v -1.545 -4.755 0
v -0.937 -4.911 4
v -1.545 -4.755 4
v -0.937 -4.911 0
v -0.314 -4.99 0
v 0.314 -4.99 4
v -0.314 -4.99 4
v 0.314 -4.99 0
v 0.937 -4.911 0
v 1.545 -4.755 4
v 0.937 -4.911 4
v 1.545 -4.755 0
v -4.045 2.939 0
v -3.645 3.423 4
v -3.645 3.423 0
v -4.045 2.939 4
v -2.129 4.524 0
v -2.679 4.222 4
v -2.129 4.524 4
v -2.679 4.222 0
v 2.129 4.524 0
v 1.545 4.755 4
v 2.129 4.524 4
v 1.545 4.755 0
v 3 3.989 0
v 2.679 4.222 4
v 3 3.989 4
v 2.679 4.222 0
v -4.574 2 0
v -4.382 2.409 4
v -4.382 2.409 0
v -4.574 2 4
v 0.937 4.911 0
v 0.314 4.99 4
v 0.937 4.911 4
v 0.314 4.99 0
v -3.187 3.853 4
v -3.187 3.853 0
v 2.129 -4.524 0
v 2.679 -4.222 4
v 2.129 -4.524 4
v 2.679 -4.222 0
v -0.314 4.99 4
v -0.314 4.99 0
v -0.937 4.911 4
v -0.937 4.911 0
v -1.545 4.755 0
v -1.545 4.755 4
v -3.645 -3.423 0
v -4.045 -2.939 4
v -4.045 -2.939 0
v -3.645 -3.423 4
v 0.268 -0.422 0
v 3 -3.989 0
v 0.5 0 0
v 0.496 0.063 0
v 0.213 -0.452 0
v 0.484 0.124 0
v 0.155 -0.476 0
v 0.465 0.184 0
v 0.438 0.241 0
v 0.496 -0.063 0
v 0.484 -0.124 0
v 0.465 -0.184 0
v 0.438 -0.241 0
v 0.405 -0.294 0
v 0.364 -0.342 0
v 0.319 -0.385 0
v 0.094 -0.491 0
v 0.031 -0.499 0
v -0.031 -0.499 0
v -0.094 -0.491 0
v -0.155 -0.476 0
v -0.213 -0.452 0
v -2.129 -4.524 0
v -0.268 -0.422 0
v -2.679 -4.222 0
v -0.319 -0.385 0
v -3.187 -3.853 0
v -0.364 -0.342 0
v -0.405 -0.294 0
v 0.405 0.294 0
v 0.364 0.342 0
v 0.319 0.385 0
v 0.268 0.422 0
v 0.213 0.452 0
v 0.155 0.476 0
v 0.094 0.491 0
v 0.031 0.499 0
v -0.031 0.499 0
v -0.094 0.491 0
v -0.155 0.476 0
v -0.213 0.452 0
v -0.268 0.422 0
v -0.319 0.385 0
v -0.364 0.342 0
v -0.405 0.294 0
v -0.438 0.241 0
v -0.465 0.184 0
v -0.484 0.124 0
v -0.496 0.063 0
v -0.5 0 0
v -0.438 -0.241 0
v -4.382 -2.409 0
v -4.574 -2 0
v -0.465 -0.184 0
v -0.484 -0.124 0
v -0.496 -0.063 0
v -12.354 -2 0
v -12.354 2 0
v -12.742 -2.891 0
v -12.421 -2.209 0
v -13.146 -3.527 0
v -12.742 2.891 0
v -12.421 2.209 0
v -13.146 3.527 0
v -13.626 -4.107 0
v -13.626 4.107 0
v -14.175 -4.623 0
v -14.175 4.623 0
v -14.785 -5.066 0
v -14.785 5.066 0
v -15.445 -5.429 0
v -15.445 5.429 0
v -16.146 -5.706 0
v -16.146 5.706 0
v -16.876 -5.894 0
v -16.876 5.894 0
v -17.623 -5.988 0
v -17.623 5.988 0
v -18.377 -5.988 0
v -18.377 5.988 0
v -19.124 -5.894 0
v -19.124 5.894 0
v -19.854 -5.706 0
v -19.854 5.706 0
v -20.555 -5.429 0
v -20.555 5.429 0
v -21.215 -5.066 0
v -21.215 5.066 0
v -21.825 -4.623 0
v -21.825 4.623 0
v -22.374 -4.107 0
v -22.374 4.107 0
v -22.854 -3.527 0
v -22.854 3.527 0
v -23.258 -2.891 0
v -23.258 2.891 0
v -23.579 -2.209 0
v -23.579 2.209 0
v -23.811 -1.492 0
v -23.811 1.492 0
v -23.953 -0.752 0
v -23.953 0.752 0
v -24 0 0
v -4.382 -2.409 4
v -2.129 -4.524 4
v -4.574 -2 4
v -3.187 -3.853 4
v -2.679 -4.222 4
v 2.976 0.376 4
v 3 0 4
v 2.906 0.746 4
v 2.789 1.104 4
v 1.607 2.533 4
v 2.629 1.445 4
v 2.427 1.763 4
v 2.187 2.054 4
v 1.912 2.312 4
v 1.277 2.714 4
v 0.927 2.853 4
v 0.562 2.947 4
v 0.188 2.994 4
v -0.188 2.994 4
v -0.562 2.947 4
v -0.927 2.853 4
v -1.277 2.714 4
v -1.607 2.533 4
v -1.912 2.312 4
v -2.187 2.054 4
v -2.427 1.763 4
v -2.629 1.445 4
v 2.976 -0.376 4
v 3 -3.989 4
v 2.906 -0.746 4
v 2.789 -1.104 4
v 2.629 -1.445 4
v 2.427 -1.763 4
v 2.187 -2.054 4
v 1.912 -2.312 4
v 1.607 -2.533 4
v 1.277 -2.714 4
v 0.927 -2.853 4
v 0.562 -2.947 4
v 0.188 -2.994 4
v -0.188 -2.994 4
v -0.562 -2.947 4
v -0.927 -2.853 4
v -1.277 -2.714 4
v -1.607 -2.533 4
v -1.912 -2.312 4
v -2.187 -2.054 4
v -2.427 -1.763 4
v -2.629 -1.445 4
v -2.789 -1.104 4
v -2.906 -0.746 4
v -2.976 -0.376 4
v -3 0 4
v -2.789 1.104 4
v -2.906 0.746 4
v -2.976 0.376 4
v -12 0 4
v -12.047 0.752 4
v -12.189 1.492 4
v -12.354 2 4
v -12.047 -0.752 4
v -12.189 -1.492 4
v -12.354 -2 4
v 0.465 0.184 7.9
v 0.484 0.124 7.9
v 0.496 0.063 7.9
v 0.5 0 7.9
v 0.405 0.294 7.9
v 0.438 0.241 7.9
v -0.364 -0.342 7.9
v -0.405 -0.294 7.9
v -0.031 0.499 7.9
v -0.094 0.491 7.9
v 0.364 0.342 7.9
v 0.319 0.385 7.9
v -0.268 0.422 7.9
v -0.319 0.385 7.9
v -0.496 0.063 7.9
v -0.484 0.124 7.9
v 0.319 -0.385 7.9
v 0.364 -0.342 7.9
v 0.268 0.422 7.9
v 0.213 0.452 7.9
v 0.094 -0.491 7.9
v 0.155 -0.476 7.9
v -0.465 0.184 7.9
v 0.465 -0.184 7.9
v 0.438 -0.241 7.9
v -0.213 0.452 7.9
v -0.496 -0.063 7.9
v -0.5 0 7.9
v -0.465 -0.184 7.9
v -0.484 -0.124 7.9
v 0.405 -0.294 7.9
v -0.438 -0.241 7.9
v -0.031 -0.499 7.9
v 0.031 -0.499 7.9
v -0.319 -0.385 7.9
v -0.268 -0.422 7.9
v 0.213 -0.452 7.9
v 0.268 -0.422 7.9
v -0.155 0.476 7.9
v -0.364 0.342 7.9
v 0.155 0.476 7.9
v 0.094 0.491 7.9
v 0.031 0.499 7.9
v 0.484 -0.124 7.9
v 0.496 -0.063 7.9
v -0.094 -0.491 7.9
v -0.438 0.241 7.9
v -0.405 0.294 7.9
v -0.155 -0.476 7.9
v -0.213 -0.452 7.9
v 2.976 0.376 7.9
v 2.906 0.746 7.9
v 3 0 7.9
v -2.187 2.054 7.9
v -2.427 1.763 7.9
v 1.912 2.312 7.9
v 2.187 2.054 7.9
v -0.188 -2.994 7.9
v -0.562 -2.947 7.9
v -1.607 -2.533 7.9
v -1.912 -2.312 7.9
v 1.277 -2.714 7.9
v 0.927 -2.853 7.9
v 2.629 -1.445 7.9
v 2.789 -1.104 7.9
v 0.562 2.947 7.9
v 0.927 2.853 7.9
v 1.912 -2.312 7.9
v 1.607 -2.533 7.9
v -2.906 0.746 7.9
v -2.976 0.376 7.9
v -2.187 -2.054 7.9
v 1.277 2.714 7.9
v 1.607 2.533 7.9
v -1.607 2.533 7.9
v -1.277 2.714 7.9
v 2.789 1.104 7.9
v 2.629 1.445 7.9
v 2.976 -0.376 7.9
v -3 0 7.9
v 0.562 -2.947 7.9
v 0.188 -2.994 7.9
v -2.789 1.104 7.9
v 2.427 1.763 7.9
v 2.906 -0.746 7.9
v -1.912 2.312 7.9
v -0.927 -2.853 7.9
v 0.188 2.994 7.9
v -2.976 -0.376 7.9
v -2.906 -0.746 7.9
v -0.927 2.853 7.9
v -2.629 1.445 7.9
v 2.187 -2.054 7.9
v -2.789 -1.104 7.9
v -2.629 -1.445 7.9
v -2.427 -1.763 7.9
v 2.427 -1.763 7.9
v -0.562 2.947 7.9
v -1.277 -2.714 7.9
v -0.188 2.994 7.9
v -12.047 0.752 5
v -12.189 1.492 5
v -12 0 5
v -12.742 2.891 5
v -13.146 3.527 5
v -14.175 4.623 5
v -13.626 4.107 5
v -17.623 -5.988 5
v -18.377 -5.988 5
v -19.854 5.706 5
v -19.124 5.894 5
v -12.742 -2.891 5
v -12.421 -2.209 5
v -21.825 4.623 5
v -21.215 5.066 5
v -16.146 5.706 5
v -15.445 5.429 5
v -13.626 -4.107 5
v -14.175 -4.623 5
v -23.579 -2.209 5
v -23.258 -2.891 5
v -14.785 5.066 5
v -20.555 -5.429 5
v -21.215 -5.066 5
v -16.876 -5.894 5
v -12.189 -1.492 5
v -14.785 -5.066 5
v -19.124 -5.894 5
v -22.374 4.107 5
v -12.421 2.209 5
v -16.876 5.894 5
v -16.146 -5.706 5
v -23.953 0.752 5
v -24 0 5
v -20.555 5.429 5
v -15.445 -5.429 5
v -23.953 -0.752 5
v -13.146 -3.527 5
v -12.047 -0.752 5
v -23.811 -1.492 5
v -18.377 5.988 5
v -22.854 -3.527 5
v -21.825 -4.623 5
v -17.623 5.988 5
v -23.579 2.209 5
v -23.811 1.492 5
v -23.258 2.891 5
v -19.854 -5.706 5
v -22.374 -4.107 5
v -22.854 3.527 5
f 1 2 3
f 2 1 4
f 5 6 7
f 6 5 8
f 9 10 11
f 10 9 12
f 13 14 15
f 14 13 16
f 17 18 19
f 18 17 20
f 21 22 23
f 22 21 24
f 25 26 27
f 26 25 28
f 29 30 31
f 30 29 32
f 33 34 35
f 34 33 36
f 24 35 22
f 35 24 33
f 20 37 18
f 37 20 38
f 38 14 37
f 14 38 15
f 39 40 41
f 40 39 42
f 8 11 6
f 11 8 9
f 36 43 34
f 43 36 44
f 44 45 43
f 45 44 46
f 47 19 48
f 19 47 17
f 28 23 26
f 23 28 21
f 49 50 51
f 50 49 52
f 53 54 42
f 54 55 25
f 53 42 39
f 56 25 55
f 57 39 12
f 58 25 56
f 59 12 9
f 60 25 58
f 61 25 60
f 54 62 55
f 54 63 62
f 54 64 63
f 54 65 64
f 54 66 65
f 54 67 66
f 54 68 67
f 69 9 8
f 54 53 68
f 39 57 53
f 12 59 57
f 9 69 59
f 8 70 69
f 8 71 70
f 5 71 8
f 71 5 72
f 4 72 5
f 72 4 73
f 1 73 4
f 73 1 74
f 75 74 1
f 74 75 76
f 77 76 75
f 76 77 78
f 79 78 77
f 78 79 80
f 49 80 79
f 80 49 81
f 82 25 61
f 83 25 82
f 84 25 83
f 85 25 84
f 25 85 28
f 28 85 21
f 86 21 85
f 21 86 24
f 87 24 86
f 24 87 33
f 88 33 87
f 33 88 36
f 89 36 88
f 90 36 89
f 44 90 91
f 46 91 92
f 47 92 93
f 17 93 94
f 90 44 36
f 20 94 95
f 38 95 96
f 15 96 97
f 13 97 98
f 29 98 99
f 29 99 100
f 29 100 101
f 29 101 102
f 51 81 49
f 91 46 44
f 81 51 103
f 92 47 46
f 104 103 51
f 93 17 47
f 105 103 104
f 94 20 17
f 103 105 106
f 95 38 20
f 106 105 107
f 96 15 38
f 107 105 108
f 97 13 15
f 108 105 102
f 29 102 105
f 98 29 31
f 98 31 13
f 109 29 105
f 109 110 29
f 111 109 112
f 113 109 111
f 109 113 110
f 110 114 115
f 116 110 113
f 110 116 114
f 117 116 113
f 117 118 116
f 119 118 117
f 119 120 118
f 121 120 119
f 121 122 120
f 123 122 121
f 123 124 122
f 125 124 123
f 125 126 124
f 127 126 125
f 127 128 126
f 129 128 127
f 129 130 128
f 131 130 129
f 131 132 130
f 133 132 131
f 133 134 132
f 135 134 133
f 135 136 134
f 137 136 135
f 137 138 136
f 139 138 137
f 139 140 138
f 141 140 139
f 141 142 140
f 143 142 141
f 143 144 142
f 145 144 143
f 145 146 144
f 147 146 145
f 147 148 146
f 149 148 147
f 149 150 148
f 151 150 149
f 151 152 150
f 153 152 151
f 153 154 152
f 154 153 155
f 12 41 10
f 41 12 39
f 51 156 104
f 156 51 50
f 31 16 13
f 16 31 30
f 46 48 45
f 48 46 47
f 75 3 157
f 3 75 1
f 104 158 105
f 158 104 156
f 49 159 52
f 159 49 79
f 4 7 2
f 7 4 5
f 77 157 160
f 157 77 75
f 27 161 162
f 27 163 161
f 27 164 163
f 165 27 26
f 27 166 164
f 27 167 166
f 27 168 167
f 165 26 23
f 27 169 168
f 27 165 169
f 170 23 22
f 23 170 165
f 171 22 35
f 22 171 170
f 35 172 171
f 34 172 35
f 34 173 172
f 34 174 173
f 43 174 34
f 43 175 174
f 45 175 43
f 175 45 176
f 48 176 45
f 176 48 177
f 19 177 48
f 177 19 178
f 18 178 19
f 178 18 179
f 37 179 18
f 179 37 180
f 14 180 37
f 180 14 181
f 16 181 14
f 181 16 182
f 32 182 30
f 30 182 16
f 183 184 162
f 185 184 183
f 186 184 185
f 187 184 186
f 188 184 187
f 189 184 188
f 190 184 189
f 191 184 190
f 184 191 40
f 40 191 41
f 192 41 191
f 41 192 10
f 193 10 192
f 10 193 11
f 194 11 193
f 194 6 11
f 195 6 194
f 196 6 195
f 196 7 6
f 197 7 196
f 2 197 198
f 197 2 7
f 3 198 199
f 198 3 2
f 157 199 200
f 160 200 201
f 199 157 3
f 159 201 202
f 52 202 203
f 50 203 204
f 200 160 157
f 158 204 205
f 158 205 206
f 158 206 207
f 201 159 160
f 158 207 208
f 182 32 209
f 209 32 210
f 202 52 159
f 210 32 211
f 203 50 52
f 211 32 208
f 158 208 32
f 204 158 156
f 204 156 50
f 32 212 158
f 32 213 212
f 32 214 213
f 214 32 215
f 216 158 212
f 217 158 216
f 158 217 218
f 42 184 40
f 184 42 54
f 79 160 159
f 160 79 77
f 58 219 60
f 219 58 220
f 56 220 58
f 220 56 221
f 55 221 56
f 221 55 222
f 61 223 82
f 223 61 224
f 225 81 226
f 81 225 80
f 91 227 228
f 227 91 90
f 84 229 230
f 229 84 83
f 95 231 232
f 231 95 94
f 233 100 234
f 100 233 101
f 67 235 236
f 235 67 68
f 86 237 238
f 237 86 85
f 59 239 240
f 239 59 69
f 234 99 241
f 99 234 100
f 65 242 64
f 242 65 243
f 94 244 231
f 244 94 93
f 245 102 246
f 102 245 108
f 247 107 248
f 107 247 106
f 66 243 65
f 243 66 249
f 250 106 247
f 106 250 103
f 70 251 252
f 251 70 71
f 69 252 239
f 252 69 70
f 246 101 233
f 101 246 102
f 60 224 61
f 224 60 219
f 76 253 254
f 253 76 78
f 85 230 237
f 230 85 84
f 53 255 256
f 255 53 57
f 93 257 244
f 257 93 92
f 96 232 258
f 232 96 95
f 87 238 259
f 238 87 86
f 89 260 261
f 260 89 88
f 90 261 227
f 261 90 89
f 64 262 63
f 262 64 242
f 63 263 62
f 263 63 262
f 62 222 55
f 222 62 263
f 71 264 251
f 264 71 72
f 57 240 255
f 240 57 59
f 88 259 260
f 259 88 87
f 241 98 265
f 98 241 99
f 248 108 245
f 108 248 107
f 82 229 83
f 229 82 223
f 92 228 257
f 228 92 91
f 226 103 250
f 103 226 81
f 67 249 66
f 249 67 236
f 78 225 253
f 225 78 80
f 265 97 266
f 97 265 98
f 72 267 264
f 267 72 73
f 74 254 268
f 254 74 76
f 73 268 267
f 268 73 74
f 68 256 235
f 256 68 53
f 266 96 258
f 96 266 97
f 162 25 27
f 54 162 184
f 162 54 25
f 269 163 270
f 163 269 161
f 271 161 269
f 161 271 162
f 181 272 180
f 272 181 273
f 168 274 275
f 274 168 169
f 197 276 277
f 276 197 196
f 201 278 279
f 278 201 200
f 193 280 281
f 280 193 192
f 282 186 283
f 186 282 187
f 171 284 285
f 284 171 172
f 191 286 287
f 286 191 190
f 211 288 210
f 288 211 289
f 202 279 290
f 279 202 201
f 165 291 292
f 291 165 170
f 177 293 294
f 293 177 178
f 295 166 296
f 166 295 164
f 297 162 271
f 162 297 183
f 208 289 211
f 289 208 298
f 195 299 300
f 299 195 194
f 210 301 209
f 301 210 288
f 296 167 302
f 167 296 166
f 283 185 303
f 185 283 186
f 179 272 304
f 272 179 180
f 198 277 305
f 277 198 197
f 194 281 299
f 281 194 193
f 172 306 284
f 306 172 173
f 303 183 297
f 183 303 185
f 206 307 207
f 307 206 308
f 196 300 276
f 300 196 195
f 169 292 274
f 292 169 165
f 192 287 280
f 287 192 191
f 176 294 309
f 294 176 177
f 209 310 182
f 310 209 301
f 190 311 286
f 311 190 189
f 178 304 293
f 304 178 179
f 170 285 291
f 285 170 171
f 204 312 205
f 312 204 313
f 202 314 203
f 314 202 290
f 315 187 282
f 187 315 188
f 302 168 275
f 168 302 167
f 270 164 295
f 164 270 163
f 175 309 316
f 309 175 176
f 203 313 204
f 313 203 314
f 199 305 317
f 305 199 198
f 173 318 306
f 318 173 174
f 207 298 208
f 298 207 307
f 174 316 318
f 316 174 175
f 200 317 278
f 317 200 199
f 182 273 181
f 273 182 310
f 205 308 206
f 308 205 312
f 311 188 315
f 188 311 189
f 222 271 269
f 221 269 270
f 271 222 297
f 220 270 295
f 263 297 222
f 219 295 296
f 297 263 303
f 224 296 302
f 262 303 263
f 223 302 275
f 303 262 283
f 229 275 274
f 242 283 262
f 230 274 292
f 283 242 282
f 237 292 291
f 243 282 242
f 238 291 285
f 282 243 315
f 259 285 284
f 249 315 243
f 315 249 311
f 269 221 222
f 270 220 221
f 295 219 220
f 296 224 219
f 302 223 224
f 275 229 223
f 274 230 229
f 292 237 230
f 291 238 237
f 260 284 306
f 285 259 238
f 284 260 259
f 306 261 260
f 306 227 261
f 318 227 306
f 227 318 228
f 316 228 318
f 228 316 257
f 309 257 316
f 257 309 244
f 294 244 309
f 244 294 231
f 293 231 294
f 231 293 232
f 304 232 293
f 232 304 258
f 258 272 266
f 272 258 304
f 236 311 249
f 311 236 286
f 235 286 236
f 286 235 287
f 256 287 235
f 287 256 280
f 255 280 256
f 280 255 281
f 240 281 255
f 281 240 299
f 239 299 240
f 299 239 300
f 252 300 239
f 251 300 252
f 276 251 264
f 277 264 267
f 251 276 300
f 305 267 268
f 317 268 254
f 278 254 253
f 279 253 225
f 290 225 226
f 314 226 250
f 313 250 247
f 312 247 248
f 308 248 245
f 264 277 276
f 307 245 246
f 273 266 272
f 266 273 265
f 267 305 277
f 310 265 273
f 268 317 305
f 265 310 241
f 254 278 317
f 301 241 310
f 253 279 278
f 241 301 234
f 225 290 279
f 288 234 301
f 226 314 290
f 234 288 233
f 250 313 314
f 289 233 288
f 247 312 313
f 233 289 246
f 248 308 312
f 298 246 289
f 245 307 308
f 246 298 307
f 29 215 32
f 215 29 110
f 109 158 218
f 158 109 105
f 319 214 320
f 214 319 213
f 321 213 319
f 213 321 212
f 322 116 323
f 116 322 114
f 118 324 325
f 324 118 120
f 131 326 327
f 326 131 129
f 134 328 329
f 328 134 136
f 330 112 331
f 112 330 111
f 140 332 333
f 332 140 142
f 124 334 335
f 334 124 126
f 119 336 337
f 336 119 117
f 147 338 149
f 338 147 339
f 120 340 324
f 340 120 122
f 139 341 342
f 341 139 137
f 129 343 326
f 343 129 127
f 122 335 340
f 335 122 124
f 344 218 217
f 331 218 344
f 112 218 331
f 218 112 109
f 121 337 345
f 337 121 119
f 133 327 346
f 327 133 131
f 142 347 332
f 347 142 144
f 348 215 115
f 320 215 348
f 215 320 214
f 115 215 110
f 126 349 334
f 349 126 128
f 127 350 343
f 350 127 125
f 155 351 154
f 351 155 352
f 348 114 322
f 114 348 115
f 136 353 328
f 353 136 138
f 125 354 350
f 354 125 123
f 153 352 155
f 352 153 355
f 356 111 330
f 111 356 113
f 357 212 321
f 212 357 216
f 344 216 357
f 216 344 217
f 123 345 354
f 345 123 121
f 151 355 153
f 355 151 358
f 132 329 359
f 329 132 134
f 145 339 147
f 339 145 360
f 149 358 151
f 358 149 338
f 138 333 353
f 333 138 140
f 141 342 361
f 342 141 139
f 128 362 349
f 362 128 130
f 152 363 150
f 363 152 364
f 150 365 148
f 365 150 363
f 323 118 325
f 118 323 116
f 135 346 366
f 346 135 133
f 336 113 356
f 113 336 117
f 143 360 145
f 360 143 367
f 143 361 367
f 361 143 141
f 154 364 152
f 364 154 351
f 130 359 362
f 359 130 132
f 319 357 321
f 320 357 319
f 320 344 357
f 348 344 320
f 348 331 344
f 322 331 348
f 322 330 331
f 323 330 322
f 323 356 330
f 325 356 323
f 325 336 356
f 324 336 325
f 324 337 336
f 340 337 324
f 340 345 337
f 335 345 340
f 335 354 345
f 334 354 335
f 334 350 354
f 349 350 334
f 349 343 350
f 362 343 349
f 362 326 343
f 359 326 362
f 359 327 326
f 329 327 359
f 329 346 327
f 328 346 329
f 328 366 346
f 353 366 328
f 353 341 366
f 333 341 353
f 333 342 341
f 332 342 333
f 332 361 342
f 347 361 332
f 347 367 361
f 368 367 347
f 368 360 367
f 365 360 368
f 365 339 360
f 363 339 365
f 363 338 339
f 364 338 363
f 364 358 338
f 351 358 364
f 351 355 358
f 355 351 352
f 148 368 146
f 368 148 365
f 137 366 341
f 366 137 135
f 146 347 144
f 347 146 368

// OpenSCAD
/*
	Parametric Eccentric Weight for Vibrobot 
	by Kevin Osborn
*/
//Shaft Diameter in mm  
shaftdiameter = 1.0; 
//Weight Diameter in mm
weightdiameter =12;
//Arm Length in mm
armLength = 12;

/* [hidden] */
shaftR = shaftdiameter/2;
weightR = weightdiameter/2;
$fn=50;

union(){
difference(){
cylinder(r1=5,r2=5,h=4);
cylinder(r1=shaftR,r2=shaftR,h=15);
translate([3,-7,0])cube([14,14,5]);
}
translate([-armLength-2,-2,0])cube([armLength,4,4]);
translate([-(armLength+weightR),0,0])cylinder(r1=weightR,r2=weightR,h=5);
difference(){
translate([0,0,3.9])cylinder(r1=3,r2=3,h=4);
cylinder(r1=shaftR,r2=shaftR,h=15);
}
}
